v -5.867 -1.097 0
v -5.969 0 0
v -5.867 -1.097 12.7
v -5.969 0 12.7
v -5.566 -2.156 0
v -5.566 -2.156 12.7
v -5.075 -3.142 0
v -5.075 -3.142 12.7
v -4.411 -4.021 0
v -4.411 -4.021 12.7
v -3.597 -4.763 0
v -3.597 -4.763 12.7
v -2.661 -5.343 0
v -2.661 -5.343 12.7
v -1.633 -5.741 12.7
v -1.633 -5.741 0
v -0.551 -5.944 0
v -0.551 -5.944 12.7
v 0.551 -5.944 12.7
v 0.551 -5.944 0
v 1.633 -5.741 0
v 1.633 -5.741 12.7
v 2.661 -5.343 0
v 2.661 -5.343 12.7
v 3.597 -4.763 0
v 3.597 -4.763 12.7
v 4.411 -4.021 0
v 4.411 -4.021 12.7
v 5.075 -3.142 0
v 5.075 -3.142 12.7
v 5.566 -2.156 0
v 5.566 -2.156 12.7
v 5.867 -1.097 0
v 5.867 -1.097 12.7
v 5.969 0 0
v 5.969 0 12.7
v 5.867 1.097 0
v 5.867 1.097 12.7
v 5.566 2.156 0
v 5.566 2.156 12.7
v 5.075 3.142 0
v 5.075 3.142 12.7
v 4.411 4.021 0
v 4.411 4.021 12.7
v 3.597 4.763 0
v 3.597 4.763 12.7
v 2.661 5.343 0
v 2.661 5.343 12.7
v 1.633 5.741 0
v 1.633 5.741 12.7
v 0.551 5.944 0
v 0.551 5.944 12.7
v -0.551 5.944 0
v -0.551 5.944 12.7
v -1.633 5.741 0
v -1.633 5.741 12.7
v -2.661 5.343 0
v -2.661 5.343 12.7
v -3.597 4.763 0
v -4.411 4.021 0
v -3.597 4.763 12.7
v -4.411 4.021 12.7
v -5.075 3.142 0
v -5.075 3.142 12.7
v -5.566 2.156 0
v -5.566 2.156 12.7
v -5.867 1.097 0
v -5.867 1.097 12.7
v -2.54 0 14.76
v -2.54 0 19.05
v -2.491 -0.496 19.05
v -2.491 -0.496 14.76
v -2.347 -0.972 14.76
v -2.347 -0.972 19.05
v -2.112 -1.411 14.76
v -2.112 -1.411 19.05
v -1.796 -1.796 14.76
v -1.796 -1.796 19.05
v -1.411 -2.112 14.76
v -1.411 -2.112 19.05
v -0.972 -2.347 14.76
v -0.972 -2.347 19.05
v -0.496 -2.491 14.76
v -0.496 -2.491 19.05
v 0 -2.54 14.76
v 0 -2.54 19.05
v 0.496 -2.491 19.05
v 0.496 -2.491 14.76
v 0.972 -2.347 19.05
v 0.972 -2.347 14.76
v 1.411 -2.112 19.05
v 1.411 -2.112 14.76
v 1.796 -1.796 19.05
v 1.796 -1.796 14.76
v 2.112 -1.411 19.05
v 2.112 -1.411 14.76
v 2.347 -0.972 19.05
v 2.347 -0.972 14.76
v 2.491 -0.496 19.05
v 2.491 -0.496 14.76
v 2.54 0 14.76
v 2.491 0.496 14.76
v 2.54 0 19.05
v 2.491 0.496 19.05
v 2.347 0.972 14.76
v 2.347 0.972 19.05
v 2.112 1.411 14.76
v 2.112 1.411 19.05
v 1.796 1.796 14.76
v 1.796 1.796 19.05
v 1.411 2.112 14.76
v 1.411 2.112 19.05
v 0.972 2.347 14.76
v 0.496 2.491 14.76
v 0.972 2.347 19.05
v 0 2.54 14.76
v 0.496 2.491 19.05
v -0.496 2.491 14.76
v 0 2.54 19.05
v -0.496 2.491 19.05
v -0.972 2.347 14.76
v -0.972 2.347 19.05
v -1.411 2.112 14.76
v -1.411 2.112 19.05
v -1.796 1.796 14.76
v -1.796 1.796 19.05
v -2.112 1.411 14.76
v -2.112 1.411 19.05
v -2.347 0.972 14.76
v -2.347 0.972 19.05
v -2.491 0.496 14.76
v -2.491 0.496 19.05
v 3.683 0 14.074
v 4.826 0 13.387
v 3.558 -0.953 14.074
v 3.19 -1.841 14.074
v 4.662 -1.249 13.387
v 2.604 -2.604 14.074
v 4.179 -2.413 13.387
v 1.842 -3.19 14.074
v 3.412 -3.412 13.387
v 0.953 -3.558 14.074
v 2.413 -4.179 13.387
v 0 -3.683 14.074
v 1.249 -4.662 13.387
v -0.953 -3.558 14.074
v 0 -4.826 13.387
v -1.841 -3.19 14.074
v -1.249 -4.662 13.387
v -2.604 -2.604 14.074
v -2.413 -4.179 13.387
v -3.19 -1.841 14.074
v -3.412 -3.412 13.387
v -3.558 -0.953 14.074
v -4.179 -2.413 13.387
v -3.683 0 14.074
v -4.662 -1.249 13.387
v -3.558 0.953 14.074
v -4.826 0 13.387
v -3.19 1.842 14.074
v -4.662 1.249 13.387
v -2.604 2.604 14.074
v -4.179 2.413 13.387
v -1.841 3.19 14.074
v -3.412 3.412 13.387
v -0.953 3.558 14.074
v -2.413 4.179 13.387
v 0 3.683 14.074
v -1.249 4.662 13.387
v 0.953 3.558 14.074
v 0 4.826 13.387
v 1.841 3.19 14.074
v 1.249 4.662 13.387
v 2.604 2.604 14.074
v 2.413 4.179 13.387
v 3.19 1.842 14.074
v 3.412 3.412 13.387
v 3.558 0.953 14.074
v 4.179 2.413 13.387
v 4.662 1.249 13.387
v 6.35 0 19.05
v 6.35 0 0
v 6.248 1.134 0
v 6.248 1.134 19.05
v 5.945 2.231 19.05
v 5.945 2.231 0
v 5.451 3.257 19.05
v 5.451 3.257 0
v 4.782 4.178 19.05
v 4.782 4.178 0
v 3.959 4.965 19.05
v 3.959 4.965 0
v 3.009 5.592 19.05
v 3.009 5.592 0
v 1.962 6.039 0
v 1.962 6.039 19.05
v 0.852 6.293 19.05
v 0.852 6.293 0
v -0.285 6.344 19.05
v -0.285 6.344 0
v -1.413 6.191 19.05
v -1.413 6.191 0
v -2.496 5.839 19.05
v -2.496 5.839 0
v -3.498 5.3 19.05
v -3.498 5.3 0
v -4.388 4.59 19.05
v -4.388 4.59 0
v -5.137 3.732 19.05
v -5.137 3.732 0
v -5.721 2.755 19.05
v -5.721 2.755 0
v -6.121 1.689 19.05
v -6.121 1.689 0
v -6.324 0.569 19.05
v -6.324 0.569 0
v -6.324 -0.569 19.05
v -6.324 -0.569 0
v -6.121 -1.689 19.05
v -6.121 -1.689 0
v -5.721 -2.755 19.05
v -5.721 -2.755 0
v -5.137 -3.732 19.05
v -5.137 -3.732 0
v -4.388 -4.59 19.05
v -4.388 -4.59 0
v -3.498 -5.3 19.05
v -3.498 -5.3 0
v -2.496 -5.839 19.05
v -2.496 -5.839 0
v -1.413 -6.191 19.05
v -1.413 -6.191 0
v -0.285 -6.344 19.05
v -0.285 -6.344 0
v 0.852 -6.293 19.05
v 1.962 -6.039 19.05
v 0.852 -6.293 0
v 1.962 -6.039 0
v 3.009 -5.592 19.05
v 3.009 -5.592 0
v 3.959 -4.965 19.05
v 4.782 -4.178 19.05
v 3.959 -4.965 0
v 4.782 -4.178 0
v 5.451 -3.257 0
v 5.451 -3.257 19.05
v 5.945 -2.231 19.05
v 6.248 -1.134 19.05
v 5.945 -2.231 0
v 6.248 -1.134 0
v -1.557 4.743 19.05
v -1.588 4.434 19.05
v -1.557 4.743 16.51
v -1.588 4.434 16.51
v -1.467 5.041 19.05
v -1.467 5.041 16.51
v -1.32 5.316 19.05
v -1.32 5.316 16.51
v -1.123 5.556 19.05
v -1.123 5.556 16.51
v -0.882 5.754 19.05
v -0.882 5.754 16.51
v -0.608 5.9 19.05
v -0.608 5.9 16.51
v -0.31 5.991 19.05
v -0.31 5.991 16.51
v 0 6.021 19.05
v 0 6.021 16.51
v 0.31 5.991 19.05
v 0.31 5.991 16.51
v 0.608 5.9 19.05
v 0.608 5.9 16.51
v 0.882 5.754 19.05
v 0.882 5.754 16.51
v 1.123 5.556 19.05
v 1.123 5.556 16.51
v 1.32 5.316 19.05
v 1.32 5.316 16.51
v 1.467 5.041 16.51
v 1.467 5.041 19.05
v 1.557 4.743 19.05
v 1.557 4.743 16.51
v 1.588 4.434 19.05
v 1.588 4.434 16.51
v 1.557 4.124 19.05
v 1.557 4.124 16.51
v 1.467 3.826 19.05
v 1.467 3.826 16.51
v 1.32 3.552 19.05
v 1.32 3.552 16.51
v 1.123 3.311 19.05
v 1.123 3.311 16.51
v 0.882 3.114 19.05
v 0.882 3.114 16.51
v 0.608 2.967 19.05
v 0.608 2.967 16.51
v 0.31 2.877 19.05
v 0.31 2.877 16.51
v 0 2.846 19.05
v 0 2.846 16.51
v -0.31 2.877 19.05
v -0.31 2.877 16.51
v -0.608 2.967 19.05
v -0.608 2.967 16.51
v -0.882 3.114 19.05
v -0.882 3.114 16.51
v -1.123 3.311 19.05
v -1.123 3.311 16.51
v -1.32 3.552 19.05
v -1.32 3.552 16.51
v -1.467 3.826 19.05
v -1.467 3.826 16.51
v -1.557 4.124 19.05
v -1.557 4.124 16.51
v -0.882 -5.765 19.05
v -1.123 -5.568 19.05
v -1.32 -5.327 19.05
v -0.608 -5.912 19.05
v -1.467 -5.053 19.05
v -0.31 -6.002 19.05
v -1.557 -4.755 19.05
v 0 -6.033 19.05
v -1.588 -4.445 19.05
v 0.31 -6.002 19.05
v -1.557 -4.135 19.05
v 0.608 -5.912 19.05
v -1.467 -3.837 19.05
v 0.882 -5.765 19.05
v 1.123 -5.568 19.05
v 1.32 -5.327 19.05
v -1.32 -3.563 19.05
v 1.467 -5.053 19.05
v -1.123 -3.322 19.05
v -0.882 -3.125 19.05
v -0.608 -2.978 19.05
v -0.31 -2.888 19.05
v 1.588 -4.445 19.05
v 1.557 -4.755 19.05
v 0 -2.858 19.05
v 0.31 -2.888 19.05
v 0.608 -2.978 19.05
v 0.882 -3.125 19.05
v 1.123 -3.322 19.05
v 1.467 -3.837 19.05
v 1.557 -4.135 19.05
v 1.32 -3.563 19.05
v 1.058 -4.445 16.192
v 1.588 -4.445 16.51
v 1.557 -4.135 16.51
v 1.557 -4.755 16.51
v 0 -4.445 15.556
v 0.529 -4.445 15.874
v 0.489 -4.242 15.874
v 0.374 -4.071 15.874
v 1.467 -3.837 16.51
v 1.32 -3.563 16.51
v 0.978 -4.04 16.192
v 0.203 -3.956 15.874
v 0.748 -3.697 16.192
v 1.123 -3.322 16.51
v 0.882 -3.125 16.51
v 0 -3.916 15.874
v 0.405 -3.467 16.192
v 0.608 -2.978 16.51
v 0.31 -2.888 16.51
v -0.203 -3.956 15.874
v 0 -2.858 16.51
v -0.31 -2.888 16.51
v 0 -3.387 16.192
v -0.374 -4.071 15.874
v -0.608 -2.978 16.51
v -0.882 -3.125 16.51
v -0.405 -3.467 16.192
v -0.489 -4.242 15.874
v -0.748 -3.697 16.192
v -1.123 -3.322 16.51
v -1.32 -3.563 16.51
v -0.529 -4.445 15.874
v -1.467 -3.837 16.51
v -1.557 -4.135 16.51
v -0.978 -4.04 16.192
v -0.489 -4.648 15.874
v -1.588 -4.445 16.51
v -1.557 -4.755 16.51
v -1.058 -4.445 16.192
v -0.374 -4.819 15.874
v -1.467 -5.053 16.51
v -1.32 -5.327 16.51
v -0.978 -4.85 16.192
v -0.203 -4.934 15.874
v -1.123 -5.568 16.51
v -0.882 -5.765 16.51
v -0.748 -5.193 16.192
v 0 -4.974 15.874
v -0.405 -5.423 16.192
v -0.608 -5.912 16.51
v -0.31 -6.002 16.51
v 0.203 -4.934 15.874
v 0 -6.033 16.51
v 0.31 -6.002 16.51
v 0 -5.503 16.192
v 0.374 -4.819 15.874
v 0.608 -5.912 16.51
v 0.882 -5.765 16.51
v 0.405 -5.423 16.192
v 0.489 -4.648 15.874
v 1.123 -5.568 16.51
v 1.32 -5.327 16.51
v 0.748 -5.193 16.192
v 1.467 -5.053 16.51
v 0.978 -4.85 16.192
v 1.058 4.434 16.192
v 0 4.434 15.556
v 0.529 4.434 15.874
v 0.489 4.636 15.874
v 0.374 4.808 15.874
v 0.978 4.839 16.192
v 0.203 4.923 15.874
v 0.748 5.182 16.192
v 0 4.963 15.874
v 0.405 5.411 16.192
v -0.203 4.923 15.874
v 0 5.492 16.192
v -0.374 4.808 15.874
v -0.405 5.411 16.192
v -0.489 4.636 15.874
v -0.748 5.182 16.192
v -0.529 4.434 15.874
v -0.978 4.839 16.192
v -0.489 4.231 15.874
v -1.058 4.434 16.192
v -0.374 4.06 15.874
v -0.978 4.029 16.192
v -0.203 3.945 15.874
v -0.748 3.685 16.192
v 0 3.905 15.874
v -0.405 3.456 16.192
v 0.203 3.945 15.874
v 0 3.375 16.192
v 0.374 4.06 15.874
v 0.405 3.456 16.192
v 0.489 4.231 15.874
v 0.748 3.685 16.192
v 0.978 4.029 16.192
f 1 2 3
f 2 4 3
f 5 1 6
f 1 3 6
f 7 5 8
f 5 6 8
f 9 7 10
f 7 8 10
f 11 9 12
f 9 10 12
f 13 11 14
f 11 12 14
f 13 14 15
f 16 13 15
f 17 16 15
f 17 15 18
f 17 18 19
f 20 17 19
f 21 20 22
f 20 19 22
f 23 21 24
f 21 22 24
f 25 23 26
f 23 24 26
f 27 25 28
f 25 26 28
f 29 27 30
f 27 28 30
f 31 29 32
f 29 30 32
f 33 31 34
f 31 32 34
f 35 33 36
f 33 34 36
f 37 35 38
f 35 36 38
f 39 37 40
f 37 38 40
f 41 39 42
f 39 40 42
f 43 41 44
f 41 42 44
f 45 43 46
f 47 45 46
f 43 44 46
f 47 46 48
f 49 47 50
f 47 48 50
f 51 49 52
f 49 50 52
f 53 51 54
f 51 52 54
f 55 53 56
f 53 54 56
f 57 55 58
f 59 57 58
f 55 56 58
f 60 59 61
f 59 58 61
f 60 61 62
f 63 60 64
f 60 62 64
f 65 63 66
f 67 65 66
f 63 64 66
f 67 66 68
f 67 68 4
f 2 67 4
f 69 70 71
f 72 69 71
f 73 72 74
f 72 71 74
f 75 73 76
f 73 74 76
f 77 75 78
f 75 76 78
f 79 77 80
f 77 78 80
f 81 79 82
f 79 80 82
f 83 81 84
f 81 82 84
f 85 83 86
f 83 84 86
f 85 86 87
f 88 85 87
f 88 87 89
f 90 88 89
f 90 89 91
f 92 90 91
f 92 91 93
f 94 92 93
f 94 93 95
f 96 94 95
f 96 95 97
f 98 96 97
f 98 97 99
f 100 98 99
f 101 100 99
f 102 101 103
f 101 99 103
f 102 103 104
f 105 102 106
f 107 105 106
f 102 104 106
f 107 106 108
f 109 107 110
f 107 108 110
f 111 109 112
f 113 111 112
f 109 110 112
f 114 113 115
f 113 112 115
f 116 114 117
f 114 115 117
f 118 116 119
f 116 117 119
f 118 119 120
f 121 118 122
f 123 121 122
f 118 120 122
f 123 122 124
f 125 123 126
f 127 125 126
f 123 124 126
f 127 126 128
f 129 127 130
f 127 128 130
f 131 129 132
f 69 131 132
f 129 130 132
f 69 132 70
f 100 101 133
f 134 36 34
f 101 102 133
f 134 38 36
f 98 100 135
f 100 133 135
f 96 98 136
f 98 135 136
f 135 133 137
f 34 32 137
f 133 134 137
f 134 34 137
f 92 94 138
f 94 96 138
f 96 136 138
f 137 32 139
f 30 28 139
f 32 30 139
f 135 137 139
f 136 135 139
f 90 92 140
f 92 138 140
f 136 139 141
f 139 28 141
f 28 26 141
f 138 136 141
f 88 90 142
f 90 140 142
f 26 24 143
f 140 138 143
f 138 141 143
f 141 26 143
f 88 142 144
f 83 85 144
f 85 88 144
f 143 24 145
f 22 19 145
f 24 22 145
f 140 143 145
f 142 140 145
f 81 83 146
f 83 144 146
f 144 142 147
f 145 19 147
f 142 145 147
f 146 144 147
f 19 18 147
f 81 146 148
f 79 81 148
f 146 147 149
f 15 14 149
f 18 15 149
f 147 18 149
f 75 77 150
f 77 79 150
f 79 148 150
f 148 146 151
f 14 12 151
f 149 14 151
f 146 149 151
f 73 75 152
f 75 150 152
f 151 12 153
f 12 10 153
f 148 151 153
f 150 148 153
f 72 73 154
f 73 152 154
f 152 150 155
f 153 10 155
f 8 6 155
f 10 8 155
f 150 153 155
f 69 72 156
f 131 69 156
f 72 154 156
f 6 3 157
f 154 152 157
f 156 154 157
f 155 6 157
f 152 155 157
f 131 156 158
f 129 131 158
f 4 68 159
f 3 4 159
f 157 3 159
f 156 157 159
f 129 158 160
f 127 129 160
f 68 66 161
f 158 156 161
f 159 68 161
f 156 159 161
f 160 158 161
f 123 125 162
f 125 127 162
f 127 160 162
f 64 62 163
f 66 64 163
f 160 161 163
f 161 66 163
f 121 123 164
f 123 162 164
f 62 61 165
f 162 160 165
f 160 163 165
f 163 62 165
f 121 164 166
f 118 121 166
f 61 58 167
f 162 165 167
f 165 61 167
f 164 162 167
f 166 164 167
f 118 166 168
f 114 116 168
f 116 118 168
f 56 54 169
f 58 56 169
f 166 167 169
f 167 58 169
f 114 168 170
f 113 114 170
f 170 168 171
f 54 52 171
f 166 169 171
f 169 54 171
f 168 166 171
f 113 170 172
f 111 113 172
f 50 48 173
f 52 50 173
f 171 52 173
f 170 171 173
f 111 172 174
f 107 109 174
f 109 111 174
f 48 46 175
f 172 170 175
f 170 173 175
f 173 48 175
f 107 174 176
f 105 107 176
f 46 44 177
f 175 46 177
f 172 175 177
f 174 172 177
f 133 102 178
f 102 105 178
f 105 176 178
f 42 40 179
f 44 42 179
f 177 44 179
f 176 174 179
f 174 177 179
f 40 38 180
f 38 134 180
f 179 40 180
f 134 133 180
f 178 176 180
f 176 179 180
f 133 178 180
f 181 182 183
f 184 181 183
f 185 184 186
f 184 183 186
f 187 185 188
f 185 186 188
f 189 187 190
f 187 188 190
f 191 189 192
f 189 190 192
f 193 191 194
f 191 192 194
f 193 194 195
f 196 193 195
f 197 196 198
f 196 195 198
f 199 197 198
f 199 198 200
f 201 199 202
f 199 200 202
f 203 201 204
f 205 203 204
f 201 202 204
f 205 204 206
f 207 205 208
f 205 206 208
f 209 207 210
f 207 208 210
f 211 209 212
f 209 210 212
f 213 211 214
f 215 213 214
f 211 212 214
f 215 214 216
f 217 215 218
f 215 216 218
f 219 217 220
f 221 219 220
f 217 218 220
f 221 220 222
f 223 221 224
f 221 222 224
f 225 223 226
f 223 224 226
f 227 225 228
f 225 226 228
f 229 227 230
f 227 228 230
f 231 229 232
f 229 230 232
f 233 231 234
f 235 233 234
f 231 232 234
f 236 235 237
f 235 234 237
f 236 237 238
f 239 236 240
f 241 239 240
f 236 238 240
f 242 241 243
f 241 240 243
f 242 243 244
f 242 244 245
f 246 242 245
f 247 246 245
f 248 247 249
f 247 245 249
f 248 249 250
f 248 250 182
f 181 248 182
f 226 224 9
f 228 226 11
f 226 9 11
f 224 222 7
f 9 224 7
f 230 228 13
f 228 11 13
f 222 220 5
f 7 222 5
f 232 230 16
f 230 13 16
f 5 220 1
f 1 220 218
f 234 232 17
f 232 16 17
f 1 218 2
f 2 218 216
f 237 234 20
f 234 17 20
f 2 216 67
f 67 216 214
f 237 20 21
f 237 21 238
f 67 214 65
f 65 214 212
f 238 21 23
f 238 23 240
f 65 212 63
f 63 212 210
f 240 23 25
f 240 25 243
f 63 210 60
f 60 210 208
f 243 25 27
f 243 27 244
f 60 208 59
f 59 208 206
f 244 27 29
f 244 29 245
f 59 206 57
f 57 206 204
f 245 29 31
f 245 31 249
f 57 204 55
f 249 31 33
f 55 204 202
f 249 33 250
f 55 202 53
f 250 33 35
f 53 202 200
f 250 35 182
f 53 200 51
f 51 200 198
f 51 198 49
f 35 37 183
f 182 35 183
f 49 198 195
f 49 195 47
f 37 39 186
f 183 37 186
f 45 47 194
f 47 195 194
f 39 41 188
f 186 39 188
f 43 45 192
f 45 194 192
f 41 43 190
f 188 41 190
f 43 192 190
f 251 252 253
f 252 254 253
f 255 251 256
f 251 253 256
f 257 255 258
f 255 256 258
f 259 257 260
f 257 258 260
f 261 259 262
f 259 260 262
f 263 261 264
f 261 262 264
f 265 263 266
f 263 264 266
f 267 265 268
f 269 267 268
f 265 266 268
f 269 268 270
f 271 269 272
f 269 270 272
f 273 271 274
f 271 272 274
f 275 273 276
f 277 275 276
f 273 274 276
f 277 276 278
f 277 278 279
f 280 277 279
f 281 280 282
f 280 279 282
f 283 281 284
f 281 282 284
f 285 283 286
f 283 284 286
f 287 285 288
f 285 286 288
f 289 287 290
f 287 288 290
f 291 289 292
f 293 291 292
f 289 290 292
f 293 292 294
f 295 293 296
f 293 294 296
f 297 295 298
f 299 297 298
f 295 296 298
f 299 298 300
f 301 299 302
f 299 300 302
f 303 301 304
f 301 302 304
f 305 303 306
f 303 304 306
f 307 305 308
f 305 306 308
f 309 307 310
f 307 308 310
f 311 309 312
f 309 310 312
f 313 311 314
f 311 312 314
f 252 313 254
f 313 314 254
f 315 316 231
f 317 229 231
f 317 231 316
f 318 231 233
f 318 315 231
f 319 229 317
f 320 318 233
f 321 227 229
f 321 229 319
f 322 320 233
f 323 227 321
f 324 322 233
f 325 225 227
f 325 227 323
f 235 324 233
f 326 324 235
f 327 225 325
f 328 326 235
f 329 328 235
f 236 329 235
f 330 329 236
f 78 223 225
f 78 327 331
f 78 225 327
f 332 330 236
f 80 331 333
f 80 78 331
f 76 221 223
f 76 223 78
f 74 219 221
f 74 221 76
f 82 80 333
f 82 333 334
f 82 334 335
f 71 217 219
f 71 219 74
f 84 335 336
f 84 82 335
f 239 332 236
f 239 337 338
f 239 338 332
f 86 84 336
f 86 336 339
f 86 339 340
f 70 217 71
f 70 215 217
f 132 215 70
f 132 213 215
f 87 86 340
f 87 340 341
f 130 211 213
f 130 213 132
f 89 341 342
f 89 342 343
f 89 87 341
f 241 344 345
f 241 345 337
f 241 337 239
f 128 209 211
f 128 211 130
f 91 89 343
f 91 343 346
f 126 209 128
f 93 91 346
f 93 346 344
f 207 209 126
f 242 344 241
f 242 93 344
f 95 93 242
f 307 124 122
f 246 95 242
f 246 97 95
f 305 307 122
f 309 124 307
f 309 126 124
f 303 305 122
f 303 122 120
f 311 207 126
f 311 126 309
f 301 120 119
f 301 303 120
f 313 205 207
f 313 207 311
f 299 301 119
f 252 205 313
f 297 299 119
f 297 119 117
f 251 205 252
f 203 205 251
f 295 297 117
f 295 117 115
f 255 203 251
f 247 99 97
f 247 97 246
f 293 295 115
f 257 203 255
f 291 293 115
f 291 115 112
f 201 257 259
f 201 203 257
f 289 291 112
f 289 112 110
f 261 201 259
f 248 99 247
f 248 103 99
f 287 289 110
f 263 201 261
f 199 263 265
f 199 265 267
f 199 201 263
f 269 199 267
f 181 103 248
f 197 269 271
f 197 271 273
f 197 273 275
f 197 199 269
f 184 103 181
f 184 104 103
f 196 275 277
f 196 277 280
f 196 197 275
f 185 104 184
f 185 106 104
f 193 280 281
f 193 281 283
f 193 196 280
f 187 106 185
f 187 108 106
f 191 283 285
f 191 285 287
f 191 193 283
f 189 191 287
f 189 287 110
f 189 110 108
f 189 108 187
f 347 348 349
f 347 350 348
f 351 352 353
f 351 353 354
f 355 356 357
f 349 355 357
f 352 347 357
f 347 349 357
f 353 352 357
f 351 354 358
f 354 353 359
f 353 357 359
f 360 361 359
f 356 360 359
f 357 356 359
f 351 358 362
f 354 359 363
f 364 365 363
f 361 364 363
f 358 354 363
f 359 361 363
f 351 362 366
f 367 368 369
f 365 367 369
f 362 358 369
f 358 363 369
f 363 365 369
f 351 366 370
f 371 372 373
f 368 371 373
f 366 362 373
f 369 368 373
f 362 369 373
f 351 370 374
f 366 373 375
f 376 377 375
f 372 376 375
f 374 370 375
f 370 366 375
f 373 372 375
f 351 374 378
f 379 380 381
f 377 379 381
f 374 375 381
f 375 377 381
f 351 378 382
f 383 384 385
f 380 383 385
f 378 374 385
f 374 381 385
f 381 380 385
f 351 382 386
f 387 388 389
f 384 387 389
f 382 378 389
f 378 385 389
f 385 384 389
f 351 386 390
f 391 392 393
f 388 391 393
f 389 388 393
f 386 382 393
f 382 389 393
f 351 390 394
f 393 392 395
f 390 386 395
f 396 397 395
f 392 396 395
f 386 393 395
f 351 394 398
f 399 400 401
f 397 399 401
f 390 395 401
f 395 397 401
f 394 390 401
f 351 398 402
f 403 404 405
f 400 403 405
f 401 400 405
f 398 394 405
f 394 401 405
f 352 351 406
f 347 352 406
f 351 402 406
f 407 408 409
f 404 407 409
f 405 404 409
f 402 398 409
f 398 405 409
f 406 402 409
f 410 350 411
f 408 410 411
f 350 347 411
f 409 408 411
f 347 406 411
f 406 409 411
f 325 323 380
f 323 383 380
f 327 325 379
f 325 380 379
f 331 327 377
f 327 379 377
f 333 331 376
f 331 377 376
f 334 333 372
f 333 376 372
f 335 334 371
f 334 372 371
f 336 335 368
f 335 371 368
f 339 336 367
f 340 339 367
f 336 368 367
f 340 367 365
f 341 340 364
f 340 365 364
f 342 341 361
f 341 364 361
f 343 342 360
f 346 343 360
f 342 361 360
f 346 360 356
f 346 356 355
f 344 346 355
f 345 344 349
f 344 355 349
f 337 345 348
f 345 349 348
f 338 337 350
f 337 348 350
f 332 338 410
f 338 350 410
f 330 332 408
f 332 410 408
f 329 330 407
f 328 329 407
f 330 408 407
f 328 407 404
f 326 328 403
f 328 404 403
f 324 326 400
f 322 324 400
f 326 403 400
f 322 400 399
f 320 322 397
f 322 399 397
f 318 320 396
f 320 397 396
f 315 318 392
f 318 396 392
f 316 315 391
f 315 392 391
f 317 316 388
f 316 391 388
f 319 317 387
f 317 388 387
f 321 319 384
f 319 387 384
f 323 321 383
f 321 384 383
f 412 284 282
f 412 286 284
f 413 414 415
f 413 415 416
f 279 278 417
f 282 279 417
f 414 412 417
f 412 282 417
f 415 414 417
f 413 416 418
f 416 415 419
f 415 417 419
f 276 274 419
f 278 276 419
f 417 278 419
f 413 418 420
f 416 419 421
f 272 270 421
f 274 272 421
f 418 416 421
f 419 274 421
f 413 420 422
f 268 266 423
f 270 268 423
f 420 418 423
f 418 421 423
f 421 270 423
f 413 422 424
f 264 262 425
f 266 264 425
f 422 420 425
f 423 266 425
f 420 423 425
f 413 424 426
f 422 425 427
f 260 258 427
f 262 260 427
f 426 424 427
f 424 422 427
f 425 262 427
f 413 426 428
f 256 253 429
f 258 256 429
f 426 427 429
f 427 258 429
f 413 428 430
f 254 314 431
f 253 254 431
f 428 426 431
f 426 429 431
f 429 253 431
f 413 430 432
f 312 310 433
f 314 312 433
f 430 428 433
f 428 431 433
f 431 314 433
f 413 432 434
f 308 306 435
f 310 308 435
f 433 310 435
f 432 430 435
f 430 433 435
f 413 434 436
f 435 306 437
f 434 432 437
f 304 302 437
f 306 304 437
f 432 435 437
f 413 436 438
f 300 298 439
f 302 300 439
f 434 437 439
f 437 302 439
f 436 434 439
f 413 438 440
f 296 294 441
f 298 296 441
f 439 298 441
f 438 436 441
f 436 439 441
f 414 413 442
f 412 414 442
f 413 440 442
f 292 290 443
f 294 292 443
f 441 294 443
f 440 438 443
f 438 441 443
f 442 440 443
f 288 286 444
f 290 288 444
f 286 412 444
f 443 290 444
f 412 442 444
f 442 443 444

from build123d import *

# Parameters (mm, degrees)
F0_R      = 6.35
F1_DEPTH  = 19.05
F3_D      = 5.08
F8_D      = 3.175
F8_DEPTH  = 2.54
F8_TIP    = 0.9538662327
F9_D      = 3.175
F9_DEPTH  = 2.54
F9_TIP    = 0.9538662327
F11_D     = 11.938
F11_DEPTH = 12.7
F11_TIP   = 3.586537035


# Not quite as in the source:
# - the program builds the solid bodies; features that only make, move or delete a surface that nothing else refers to are left out


with BuildPart() as f1:
    # F0 (on Top) → F1 (new body)
    with BuildSketch(Plane.XY):
        Circle(F0_R)
    extrude(amount=F1_DEPTH)

    # F3 (through all)
    with Locations(Plane(origin=(0, 0, 0), x_dir=(1, 0, 0), z_dir=(0, 0, -1))):
        with Locations((0, 0)):
            Hole(F3_D / 2)

    # F8
    with Locations(Plane.XY.offset(19.05)):
        with Locations((0, 4.4337138534)):
            Hole(F8_D / 2, depth=F8_DEPTH)
            with Locations((0, 0, -(F8_DEPTH + F8_TIP / 2))):  # 118° drill point
                Cone(0, F8_D / 2, F8_TIP, mode=Mode.SUBTRACT)

    # F9
    with Locations(Plane.XY.offset(19.05)):
        with Locations((0, -4.445)):
            Hole(F9_D / 2, depth=F9_DEPTH)
            with Locations((0, 0, -(F9_DEPTH + F9_TIP / 2))):  # 118° drill point
                Cone(0, F9_D / 2, F9_TIP, mode=Mode.SUBTRACT)

    # F11
    with Locations(Plane(origin=(0, 0, 0), x_dir=(1, 0, 0), z_dir=(0, 0, -1))):
        with Locations((0, 0)):
            Hole(F11_D / 2, depth=F11_DEPTH)
            with Locations((0, 0, -(F11_DEPTH + F11_TIP / 2))):  # 118° drill point
                Cone(0, F11_D / 2, F11_TIP, mode=Mode.SUBTRACT)


solid = f1.part
